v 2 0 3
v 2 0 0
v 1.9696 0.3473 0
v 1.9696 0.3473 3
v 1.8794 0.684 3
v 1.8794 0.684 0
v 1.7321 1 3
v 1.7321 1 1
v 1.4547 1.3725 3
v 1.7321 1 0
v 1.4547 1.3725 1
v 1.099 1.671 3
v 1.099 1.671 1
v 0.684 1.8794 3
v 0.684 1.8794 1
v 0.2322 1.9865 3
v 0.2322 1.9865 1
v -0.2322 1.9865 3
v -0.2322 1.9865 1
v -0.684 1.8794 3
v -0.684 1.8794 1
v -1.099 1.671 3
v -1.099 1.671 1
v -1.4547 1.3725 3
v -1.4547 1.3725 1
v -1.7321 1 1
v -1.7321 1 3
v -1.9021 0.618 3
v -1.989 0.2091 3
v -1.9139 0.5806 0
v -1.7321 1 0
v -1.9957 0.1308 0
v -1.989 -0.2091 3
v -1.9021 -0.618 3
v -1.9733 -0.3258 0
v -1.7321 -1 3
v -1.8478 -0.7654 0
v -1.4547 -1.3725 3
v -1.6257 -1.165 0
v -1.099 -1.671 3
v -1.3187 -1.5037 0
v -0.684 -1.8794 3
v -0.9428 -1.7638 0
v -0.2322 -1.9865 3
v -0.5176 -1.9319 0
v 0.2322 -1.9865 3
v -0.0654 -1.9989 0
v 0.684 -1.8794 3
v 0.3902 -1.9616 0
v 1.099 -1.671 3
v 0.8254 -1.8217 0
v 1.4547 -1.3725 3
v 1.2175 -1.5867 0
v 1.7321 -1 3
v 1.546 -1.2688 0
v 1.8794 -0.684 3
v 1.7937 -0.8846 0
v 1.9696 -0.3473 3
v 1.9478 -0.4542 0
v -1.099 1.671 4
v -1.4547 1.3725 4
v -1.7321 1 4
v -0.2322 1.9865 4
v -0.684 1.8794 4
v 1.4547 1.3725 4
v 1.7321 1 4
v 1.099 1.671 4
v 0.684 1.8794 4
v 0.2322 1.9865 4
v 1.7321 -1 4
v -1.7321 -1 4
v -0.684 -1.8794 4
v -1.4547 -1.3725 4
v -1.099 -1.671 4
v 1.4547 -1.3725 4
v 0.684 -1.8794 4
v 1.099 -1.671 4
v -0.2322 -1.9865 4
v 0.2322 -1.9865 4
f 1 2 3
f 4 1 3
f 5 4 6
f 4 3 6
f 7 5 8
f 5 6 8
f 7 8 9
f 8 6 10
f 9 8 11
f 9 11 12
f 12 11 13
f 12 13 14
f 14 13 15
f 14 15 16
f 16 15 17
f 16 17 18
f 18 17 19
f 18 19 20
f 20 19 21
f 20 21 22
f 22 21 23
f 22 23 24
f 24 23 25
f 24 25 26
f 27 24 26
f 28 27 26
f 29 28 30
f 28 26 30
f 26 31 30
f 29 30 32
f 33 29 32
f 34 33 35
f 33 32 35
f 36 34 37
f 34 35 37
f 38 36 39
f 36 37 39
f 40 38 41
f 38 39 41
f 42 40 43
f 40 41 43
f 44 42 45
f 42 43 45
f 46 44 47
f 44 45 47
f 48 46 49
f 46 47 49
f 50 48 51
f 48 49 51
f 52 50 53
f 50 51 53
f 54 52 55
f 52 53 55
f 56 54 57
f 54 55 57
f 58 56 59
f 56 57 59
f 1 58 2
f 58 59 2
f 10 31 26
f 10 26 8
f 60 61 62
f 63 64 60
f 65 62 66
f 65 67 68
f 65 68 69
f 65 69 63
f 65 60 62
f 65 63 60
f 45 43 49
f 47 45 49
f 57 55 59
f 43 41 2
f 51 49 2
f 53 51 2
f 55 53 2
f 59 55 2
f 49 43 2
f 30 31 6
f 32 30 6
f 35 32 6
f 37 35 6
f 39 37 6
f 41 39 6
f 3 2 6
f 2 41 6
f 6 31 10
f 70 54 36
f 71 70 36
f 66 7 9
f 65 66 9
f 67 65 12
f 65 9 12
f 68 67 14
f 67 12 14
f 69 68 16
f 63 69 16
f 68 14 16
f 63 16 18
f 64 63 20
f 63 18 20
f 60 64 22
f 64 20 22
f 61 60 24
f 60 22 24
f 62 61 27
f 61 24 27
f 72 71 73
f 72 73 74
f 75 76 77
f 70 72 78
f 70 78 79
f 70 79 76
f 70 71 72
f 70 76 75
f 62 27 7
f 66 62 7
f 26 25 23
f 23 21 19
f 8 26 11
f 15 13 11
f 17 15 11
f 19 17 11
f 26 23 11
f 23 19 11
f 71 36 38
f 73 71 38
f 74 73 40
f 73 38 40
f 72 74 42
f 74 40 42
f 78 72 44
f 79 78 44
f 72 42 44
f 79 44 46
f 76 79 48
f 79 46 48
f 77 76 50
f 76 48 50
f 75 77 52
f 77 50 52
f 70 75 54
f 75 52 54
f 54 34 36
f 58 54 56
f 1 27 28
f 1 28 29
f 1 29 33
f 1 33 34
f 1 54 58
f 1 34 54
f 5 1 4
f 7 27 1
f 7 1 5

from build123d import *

# Parameters (mm, degrees)
SKETCH1_R           = 2
BOSS_EXTRUDE1_DEPTH = 3
BOSS_EXTRUDE2_DEPTH = 1
CUT_EXTRUDE1_DEPTH  = 1
BOSS_EXTRUDE3_DEPTH = 1


with BuildPart() as part:
    # Sketch1 → Boss-Extrude1 (new body)
    with BuildSketch(Plane.XY):
        Circle(SKETCH1_R)
    extrude(amount=BOSS_EXTRUDE1_DEPTH)

    # Sketch2 → Boss-Extrude2 (add)
    with BuildSketch(Plane.XY.offset(3)):
        with BuildLine():
            Line((-1.732050808, 1), (1.732050808, 1))
            ThreePointArc((1.732050808, 1), (0, 2), (-1.732050808, 1))
        make_face()
    extrude(amount=BOSS_EXTRUDE2_DEPTH)

    # Sketch3 → Cut-Extrude1 (cut)
    with BuildSketch(Plane(origin=(0, 0, 0), x_dir=(-1, 0, 0), z_dir=(0, 0, -1))):
        with BuildLine():
            Line((1.732050808, 1), (-1.732050808, 1))
            ThreePointArc((-1.732050808, 1), (0, 2), (1.732050808, 1))
        make_face()
    extrude(amount=-CUT_EXTRUDE1_DEPTH, mode=Mode.SUBTRACT)

    # Sketch4 → Boss-Extrude3 (add)
    with BuildSketch(Plane.XY.offset(3)):
        with BuildLine():
            Line((1.732050808, -1), (-1.732050808, -1))
            ThreePointArc((-1.732050808, -1), (0, -2), (1.732050808, -1))
        make_face()
    extrude(amount=BOSS_EXTRUDE3_DEPTH)


solid = part.part
